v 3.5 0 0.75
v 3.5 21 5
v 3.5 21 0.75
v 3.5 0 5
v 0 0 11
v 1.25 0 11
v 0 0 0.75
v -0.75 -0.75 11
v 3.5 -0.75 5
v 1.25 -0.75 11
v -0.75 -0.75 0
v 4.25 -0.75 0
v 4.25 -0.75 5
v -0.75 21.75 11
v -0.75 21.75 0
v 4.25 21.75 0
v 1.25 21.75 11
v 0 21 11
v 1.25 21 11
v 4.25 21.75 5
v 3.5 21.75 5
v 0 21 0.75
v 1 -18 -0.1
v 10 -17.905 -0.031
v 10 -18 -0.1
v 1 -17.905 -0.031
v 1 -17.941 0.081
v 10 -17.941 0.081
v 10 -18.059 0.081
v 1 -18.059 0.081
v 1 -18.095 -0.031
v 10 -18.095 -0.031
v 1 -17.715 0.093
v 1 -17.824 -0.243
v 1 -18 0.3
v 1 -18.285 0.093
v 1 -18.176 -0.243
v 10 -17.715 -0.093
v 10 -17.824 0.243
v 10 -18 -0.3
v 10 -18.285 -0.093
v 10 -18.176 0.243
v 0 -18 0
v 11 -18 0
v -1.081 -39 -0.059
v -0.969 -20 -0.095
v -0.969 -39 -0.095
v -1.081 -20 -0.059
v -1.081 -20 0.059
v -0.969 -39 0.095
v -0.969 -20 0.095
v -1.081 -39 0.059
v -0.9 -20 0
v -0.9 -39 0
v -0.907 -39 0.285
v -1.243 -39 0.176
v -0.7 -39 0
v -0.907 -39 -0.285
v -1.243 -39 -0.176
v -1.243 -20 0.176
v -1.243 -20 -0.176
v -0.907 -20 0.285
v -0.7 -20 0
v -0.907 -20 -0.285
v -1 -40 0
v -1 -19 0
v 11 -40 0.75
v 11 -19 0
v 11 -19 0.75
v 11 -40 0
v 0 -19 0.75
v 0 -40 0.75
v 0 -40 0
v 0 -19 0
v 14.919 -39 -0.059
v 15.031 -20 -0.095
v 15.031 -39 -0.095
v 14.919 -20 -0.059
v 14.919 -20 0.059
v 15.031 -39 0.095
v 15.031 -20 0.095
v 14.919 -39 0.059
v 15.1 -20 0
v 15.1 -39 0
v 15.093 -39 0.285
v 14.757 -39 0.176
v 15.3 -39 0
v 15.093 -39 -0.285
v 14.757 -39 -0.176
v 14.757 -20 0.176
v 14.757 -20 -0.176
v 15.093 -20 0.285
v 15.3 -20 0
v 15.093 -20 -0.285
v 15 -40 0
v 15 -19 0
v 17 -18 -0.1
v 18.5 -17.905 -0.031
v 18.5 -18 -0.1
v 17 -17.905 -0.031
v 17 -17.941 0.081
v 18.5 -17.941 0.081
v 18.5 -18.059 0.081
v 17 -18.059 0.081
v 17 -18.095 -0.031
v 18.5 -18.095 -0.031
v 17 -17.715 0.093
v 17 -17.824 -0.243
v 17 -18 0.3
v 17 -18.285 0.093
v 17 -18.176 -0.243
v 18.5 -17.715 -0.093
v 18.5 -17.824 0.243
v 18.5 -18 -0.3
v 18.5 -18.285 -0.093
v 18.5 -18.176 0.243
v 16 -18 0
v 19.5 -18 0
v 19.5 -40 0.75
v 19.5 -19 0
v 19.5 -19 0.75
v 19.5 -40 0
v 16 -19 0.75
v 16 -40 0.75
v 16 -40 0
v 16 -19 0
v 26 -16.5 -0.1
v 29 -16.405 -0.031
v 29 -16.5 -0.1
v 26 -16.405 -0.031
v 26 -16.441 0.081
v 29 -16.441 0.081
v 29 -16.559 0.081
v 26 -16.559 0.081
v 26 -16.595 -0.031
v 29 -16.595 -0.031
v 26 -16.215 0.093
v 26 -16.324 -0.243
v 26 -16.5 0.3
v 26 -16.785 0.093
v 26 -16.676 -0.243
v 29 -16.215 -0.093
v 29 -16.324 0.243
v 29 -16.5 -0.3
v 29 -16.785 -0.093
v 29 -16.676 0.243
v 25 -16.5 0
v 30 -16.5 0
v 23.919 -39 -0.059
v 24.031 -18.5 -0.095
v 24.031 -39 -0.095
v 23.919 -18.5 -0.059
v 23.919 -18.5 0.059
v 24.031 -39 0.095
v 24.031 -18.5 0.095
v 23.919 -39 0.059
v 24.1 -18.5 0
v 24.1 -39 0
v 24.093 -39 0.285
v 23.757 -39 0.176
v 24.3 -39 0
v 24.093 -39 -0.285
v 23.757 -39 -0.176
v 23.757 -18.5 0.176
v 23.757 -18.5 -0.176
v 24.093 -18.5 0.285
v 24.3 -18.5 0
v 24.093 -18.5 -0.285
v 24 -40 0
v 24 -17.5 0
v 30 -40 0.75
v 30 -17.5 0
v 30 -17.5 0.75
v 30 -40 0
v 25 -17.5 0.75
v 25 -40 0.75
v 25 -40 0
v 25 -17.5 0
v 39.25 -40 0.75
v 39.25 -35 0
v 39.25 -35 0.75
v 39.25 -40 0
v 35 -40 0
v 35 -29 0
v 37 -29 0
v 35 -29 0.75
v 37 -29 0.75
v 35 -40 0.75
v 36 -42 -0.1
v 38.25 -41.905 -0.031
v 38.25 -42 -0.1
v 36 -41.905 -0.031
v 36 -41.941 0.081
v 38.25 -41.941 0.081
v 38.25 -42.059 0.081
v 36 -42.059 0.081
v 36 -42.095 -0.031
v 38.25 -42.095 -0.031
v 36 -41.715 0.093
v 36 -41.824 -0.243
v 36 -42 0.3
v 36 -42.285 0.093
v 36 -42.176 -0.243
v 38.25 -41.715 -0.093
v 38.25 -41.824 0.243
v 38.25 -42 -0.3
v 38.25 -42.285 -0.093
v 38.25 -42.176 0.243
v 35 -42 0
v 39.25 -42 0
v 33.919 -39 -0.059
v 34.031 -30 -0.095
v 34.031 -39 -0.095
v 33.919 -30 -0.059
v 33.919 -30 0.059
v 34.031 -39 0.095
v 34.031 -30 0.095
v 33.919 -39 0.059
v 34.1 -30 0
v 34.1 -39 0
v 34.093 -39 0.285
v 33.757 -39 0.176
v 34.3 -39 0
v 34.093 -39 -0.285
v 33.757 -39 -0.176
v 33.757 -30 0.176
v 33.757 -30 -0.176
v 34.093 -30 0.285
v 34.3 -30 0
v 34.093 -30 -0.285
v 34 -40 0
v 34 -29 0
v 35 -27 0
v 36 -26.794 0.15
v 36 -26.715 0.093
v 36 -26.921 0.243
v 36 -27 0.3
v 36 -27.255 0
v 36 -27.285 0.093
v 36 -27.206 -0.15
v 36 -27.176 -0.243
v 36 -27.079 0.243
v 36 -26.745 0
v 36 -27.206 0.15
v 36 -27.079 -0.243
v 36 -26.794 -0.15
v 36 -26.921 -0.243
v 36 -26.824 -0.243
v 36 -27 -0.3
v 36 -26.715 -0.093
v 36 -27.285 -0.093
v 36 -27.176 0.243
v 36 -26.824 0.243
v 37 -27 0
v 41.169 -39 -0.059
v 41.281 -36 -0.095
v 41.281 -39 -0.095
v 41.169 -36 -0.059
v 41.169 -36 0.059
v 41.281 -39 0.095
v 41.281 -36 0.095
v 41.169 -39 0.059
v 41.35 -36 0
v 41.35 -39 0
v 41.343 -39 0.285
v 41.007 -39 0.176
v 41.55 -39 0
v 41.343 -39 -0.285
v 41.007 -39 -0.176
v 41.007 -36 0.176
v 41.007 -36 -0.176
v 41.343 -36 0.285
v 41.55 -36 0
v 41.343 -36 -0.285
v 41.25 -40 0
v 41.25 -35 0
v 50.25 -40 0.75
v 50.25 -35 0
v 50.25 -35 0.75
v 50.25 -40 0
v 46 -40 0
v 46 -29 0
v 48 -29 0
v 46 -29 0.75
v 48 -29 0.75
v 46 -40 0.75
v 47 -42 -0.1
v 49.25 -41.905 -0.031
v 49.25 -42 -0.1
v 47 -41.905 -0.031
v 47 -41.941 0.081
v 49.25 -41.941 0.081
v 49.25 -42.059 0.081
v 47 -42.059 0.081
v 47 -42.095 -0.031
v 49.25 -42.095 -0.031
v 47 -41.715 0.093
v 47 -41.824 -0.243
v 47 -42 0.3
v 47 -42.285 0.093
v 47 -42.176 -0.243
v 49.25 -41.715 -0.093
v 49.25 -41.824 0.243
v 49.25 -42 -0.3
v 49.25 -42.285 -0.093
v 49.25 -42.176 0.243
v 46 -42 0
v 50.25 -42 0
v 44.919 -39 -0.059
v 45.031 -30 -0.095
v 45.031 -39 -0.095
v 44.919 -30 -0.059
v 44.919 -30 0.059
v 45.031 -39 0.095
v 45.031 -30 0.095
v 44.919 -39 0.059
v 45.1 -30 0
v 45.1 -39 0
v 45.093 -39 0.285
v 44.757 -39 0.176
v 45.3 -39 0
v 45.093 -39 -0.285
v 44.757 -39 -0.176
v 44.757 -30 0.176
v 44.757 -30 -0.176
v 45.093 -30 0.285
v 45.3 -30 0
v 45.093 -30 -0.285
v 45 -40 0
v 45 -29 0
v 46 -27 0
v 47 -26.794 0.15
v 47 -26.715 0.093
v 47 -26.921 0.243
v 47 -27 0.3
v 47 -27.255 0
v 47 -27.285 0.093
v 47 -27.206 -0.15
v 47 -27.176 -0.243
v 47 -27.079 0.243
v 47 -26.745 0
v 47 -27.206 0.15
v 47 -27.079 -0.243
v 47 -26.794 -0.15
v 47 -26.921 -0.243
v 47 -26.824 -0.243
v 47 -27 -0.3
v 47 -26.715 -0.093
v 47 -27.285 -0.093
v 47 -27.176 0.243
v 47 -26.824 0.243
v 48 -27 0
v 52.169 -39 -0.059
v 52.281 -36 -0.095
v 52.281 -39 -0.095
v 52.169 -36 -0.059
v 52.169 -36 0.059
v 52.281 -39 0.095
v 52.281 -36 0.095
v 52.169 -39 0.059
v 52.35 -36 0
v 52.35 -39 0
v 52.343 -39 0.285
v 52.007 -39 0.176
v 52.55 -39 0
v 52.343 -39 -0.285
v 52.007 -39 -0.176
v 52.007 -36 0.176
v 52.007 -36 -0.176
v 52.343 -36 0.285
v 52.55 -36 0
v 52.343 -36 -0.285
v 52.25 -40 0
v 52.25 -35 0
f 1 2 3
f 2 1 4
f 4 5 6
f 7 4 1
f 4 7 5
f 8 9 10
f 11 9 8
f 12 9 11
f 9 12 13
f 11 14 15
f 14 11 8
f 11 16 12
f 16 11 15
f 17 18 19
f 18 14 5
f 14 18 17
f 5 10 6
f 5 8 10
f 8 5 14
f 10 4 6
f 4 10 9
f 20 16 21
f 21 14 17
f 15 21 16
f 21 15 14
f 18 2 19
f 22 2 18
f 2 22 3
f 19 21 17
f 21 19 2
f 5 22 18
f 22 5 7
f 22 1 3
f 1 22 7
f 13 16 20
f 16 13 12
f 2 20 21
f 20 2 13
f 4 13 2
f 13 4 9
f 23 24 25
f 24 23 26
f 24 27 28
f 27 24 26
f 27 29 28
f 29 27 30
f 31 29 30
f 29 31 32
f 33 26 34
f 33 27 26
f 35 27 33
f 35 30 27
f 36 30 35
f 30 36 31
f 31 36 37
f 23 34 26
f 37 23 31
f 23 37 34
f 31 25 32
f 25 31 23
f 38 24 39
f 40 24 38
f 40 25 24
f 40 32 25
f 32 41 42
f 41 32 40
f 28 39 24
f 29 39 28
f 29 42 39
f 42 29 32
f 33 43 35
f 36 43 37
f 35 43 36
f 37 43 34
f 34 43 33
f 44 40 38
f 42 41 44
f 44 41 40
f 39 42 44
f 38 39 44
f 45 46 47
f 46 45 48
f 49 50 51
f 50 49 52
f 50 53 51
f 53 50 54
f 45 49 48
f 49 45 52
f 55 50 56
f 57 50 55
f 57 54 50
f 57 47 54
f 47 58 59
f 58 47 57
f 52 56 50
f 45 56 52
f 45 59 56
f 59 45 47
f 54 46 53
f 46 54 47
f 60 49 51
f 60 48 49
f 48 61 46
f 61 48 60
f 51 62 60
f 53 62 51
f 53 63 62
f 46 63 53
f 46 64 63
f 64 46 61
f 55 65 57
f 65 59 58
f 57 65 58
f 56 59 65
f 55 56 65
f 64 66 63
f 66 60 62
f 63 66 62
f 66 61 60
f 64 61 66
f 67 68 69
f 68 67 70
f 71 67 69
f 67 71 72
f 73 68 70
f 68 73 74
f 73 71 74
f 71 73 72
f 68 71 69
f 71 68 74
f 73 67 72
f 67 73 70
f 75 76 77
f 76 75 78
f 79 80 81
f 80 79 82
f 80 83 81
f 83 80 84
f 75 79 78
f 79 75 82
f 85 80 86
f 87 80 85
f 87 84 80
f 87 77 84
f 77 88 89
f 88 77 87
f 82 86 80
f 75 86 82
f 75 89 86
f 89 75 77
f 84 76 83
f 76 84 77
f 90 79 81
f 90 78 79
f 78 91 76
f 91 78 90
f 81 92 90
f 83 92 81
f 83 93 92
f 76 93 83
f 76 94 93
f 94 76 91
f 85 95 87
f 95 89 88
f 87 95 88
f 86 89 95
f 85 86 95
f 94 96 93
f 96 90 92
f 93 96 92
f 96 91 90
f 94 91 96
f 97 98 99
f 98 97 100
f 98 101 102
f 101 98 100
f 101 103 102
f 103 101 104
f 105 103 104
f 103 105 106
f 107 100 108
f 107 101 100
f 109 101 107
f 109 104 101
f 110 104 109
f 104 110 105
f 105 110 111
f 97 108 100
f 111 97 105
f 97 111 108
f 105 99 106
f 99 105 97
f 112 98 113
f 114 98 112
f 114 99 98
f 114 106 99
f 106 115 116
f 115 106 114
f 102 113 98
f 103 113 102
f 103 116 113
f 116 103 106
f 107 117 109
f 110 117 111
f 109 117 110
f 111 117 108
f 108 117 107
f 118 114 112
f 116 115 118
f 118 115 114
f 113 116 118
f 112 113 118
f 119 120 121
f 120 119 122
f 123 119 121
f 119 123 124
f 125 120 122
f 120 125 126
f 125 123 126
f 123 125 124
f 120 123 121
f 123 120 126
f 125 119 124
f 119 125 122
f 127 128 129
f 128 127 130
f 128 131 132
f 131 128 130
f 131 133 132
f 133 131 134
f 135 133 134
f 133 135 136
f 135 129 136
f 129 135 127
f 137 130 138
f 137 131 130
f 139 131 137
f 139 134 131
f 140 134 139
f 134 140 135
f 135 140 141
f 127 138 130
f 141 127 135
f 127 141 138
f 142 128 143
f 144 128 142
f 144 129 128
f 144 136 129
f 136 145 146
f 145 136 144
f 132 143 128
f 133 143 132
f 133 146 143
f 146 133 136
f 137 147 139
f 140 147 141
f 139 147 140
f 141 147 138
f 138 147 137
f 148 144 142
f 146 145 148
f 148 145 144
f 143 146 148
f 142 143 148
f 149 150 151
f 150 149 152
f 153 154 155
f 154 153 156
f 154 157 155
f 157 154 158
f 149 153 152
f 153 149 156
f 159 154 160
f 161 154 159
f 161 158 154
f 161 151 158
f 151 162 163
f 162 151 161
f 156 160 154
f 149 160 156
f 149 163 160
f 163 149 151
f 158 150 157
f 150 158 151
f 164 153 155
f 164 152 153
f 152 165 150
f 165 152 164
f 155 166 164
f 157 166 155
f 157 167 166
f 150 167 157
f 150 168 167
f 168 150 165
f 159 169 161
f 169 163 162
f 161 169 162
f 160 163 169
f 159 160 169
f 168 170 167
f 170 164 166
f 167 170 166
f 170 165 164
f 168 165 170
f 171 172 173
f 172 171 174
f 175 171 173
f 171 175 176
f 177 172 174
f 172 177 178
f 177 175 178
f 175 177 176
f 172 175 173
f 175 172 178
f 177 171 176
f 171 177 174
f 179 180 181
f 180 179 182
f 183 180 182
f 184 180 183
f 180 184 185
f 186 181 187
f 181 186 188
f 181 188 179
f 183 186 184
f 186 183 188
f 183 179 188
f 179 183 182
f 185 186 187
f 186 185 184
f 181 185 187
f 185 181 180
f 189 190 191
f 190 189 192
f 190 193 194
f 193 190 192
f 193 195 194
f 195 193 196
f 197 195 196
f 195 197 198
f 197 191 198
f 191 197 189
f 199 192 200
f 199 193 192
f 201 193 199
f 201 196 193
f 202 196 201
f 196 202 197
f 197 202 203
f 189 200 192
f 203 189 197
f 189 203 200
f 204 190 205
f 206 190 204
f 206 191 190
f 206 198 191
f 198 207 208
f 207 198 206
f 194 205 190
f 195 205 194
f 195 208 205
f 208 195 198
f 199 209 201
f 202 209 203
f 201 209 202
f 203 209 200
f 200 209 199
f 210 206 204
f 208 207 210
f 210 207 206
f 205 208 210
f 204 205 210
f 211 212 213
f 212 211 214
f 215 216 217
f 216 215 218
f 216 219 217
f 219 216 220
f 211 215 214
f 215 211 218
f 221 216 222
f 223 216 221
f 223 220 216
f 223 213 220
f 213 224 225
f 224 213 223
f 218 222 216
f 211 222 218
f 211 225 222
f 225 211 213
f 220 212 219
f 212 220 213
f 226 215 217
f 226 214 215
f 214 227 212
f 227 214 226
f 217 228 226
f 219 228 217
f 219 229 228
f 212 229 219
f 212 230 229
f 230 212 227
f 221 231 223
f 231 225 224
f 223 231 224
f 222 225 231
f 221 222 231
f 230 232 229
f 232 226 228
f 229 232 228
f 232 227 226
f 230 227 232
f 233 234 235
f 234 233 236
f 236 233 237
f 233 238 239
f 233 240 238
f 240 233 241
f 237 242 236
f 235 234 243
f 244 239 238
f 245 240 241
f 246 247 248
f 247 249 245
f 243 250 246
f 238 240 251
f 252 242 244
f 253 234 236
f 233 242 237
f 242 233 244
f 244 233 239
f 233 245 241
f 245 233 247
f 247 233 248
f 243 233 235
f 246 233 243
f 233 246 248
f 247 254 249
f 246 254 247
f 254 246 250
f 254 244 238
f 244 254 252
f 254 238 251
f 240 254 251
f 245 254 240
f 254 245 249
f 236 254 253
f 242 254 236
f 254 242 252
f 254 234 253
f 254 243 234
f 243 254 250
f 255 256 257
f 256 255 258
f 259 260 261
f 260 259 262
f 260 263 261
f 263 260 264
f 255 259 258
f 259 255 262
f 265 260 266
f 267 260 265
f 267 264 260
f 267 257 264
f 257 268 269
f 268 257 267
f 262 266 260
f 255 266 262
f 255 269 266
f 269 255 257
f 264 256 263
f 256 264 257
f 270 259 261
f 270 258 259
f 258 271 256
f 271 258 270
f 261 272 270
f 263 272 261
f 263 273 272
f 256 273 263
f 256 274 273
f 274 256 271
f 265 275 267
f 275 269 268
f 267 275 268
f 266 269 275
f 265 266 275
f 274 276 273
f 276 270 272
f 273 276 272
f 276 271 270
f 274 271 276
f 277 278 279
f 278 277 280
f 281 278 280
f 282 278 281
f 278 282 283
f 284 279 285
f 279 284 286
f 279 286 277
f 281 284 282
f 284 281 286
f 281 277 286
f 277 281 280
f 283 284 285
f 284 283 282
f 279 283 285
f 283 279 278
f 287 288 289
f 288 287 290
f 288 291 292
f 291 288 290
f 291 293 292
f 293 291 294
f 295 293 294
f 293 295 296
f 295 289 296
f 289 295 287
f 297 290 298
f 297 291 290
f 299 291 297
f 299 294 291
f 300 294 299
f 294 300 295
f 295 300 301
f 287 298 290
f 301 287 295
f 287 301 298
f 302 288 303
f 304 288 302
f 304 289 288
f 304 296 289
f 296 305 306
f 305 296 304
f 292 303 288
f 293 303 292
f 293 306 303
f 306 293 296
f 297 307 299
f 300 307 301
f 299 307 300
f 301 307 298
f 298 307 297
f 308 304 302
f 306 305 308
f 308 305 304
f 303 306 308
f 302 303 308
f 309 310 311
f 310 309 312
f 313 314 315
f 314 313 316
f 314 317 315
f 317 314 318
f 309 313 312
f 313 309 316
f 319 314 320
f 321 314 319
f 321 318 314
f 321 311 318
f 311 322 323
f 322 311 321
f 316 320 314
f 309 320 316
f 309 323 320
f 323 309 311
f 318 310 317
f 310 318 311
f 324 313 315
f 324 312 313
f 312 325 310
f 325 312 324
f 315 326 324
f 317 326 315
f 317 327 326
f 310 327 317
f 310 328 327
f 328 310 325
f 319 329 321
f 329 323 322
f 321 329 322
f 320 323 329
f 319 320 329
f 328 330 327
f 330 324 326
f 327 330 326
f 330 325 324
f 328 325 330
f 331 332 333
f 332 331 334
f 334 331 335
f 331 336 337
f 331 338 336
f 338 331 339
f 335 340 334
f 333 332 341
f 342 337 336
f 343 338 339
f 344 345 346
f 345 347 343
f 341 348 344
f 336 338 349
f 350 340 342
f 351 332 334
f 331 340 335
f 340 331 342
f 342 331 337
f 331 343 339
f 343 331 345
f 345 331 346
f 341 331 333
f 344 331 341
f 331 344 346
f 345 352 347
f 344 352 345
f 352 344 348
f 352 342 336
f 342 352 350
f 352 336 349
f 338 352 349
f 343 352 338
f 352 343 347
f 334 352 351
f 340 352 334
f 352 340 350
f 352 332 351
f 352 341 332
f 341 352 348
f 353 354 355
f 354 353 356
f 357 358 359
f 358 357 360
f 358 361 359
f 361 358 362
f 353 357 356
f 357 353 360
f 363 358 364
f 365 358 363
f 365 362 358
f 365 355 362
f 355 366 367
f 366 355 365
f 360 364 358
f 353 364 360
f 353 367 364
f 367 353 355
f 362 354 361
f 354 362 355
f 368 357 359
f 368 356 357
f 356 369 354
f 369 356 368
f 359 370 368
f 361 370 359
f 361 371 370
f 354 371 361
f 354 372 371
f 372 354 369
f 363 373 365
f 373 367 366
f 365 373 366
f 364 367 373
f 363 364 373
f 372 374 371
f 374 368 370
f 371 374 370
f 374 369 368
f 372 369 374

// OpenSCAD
// file: ../lib/common.scad
//--------------------------------------------------------------------------------------------------
// Module Prism
//--------------------------------------------------------------------------------------------------
module prism(z, y, x)
{
    rotate([0, 90, 0])
    {
        polyhedron(
                points=[[0,0,0], [x,0,0], [x,y,0], [0,y,0], [0,y,z], [x,y,z]],
                faces=[[0,1,2,3],[5,4,3,2],[0,4,5,1],[0,3,4],[5,2,1]]);
    }
    
}

//--------------------------------------------------------------------------------------------------
// Module Side panel
//--------------------------------------------------------------------------------------------------
module rect_cut(x, y, z, dx, dy)
{
    // Top panel
    translate([0, dy, 0])
    {
        cube([x, y - dy, z]);
    };

    // Left bottom panel
    translate([0, 0, 0])
    {
        cube([dx, dy, z]);
    };

    // Triangle
    translate([dx, 0, 0])
    {
        rotate([0, 0, 0])
        {
            prism(x - dx, dy, -z);
        }
    };
}

//--------------------------------------------------------------------------------------------------
// X dimensional arrow
//--------------------------------------------------------------------------------------------------
module arrow_x(l)
{
    line_w = 0.1;
    arrow_w = 1;
    arrow_h = 0.3;

    // Line
    translate([l / 2, 0, 0])
    {
        rotate([0, 90, 0])
        {
            color([0.4, 0.4, 0.4])
            cylinder(l - arrow_w * 2, line_w, line_w, true);
        }
    }

    // Left arrow
    translate([arrow_w, 0, 0])
    {
        rotate([0, 270, 0])
        {
            color([0.4, 0.4, 0.4])
            cylinder(arrow_w, arrow_h, 0, false);
        }
    }

    // Right arrow
    translate([l - arrow_w, 0, 0])
    {
        rotate([0, 90, 0])
        {
            color([0.4, 0.4, 0.4])
            cylinder(arrow_w, arrow_h, 0, false);
        }
    }

    // Text
    translate([l/3, 0.5, 0])
    {
        color([0.4, 0.4, 0.4])
        text(str(l), size=1);
    }
}

//--------------------------------------------------------------------------------------------------
// Y dimensional arrow
//--------------------------------------------------------------------------------------------------
module arrow_y(l)
{
    line_w = 0.1;
    arrow_w = 1;
    arrow_h = 0.3;

    // Line
    translate([0, l / 2, 0])
    {
        rotate([90, 0, 00])
        {
            color([0.4, 0.4, 0.4])
            cylinder(l - arrow_w * 2, line_w, line_w, true);
        }
    }

    // Left arrow
    translate([0 ,arrow_w, 0])
    {
        rotate([90, 0, 0])
        {
            color([0.4, 0.4, 0.4])
            cylinder(arrow_w, arrow_h, 0, false);
        }
    }

    // Right arrow
    translate([0, l - arrow_w, 0])
    {
        rotate([270, 0, 0])
        {
            color([0.4, 0.4, 0.4])
            cylinder(arrow_w, arrow_h, 0, false);
        }
    }

    // Text
    translate([-0.5, l/3, 0])
    {
        rotate([0 ,0, 90])
        {
            color([0.4, 0.4, 0.4])
            text(str(l), size=1);
        }
    }
}
// main file
include <../lib/common.scad>

//--------------------------------------------------------------------------------------------------
module back_panel()
{
    color([1, 0, 0])
    cube([11, 21, 0.75]);
}

//--------------------------------------------------------------------------------------------------
module bottom_board()
{
    color([0,1,1])
    cube([3.5, 21, 0.75]);
}

//--------------------------------------------------------------------------------------------------
module front_panel()
{
    color([0,0,1])
    cube([5, 22.5, 0.75]);
}

//--------------------------------------------------------------------------------------------------
module side_panel()
{
    translate([0, 11, 0.75])
    {
        rotate([180, 0, 0])
        {
            color([0, 1, 0])
            rect_cut(4.25, 11, 0.75, 2, 6);
        }
    }
}

//--------------------------------------------------------------------------------------------------
// Render
//--------------------------------------------------------------------------------------------------
translate([0, 0, 0])
{
    //----------------------------------------------------------------------------------------------
    // Back panel
    //----------------------------------------------------------------------------------------------
    translate([-0.75, 0, 11])
    {
        rotate([0, 90, 0])
        {
            back_panel();
        }
    };

    //----------------------------------------------------------------------------------------------
    // Bottom board
    //----------------------------------------------------------------------------------------------
    translate([0, 0, 0])
    {
        bottom_board();
    };

    //----------------------------------------------------------------------------------------------
    // Front panel
    //----------------------------------------------------------------------------------------------
    translate([3.5, -0.75, 5])
    {
        rotate([0, 90, 0])
        {
            front_panel();
        }
    };

    //----------------------------------------------------------------------------------------------
    // Left panel
    //----------------------------------------------------------------------------------------------
    translate([-0.75, 0, 0])
    {
        rotate([90, 0, 0])
        {
            side_panel();
        }
    };

    //----------------------------------------------------------------------------------------------
    // Right panel
    //----------------------------------------------------------------------------------------------
    translate([-0.75, 21.75, 0])
    {
        rotate([90, 0, 0])
        {
            side_panel();
        }
    };
}



//--------------------------------------------------------------------------------------------------
// Draw Parts
//--------------------------------------------------------------------------------------------------
translate([0, -40, 0])
{
    //----------------------------------------------------------------------------------------------
    // Back panel
    //----------------------------------------------------------------------------------------------
    translate([0, 0, 0])
    {
        back_panel();

        translate([0, 22, 0])
        {
            arrow_x(11);
        };

        translate([-1, 0, 0])
        {
            arrow_y(21);
        };
    };

    //----------------------------------------------------------------------------------------------
    // Bottom board
    //----------------------------------------------------------------------------------------------
    translate([16, 0, 0])
    {
        bottom_board();

        translate([0, 22, 0])
        {
            arrow_x(3.5);
        };

        translate([-1, 0, 0])
        {
            arrow_y(21);
        }
    };

    //----------------------------------------------------------------------------------------------
    // Front panel
    //----------------------------------------------------------------------------------------------
    translate([25, 0, 0])
    {
        front_panel();

        translate([0, 23.5, 0])
        {
            arrow_x(5);
        };

        translate([-1, 0, 0])
        {
            arrow_y(22.5);
        }
    };

    //----------------------------------------------------------------------------------------------
    // Left panel
    //----------------------------------------------------------------------------------------------
    translate([35, 0, 0])
    {
        side_panel();

        translate([0, -2, 0])
        {
            arrow_x(4.25);
        };

        translate([-1, 0, 0])
        {
            arrow_y(11);
        };

        translate([0, 13, 0])
        {
            arrow_x(2);
        };

        translate([6.25, 0, 0])
        {
            arrow_y(5);
        };
    };

    //----------------------------------------------------------------------------------------------
    // Right panel
    //----------------------------------------------------------------------------------------------
    translate([46, 0, 0])
    {
        side_panel();

        translate([0, -2, 0])
        {
            arrow_x(4.25);
        };

        translate([-1, 0, 0])
        {
            arrow_y(11);
        };

        translate([0, 13, 0])
        {
            arrow_x(2);
        };

        translate([6.25, 0, 0])
        {
            arrow_y(5);
        };
    };
}
